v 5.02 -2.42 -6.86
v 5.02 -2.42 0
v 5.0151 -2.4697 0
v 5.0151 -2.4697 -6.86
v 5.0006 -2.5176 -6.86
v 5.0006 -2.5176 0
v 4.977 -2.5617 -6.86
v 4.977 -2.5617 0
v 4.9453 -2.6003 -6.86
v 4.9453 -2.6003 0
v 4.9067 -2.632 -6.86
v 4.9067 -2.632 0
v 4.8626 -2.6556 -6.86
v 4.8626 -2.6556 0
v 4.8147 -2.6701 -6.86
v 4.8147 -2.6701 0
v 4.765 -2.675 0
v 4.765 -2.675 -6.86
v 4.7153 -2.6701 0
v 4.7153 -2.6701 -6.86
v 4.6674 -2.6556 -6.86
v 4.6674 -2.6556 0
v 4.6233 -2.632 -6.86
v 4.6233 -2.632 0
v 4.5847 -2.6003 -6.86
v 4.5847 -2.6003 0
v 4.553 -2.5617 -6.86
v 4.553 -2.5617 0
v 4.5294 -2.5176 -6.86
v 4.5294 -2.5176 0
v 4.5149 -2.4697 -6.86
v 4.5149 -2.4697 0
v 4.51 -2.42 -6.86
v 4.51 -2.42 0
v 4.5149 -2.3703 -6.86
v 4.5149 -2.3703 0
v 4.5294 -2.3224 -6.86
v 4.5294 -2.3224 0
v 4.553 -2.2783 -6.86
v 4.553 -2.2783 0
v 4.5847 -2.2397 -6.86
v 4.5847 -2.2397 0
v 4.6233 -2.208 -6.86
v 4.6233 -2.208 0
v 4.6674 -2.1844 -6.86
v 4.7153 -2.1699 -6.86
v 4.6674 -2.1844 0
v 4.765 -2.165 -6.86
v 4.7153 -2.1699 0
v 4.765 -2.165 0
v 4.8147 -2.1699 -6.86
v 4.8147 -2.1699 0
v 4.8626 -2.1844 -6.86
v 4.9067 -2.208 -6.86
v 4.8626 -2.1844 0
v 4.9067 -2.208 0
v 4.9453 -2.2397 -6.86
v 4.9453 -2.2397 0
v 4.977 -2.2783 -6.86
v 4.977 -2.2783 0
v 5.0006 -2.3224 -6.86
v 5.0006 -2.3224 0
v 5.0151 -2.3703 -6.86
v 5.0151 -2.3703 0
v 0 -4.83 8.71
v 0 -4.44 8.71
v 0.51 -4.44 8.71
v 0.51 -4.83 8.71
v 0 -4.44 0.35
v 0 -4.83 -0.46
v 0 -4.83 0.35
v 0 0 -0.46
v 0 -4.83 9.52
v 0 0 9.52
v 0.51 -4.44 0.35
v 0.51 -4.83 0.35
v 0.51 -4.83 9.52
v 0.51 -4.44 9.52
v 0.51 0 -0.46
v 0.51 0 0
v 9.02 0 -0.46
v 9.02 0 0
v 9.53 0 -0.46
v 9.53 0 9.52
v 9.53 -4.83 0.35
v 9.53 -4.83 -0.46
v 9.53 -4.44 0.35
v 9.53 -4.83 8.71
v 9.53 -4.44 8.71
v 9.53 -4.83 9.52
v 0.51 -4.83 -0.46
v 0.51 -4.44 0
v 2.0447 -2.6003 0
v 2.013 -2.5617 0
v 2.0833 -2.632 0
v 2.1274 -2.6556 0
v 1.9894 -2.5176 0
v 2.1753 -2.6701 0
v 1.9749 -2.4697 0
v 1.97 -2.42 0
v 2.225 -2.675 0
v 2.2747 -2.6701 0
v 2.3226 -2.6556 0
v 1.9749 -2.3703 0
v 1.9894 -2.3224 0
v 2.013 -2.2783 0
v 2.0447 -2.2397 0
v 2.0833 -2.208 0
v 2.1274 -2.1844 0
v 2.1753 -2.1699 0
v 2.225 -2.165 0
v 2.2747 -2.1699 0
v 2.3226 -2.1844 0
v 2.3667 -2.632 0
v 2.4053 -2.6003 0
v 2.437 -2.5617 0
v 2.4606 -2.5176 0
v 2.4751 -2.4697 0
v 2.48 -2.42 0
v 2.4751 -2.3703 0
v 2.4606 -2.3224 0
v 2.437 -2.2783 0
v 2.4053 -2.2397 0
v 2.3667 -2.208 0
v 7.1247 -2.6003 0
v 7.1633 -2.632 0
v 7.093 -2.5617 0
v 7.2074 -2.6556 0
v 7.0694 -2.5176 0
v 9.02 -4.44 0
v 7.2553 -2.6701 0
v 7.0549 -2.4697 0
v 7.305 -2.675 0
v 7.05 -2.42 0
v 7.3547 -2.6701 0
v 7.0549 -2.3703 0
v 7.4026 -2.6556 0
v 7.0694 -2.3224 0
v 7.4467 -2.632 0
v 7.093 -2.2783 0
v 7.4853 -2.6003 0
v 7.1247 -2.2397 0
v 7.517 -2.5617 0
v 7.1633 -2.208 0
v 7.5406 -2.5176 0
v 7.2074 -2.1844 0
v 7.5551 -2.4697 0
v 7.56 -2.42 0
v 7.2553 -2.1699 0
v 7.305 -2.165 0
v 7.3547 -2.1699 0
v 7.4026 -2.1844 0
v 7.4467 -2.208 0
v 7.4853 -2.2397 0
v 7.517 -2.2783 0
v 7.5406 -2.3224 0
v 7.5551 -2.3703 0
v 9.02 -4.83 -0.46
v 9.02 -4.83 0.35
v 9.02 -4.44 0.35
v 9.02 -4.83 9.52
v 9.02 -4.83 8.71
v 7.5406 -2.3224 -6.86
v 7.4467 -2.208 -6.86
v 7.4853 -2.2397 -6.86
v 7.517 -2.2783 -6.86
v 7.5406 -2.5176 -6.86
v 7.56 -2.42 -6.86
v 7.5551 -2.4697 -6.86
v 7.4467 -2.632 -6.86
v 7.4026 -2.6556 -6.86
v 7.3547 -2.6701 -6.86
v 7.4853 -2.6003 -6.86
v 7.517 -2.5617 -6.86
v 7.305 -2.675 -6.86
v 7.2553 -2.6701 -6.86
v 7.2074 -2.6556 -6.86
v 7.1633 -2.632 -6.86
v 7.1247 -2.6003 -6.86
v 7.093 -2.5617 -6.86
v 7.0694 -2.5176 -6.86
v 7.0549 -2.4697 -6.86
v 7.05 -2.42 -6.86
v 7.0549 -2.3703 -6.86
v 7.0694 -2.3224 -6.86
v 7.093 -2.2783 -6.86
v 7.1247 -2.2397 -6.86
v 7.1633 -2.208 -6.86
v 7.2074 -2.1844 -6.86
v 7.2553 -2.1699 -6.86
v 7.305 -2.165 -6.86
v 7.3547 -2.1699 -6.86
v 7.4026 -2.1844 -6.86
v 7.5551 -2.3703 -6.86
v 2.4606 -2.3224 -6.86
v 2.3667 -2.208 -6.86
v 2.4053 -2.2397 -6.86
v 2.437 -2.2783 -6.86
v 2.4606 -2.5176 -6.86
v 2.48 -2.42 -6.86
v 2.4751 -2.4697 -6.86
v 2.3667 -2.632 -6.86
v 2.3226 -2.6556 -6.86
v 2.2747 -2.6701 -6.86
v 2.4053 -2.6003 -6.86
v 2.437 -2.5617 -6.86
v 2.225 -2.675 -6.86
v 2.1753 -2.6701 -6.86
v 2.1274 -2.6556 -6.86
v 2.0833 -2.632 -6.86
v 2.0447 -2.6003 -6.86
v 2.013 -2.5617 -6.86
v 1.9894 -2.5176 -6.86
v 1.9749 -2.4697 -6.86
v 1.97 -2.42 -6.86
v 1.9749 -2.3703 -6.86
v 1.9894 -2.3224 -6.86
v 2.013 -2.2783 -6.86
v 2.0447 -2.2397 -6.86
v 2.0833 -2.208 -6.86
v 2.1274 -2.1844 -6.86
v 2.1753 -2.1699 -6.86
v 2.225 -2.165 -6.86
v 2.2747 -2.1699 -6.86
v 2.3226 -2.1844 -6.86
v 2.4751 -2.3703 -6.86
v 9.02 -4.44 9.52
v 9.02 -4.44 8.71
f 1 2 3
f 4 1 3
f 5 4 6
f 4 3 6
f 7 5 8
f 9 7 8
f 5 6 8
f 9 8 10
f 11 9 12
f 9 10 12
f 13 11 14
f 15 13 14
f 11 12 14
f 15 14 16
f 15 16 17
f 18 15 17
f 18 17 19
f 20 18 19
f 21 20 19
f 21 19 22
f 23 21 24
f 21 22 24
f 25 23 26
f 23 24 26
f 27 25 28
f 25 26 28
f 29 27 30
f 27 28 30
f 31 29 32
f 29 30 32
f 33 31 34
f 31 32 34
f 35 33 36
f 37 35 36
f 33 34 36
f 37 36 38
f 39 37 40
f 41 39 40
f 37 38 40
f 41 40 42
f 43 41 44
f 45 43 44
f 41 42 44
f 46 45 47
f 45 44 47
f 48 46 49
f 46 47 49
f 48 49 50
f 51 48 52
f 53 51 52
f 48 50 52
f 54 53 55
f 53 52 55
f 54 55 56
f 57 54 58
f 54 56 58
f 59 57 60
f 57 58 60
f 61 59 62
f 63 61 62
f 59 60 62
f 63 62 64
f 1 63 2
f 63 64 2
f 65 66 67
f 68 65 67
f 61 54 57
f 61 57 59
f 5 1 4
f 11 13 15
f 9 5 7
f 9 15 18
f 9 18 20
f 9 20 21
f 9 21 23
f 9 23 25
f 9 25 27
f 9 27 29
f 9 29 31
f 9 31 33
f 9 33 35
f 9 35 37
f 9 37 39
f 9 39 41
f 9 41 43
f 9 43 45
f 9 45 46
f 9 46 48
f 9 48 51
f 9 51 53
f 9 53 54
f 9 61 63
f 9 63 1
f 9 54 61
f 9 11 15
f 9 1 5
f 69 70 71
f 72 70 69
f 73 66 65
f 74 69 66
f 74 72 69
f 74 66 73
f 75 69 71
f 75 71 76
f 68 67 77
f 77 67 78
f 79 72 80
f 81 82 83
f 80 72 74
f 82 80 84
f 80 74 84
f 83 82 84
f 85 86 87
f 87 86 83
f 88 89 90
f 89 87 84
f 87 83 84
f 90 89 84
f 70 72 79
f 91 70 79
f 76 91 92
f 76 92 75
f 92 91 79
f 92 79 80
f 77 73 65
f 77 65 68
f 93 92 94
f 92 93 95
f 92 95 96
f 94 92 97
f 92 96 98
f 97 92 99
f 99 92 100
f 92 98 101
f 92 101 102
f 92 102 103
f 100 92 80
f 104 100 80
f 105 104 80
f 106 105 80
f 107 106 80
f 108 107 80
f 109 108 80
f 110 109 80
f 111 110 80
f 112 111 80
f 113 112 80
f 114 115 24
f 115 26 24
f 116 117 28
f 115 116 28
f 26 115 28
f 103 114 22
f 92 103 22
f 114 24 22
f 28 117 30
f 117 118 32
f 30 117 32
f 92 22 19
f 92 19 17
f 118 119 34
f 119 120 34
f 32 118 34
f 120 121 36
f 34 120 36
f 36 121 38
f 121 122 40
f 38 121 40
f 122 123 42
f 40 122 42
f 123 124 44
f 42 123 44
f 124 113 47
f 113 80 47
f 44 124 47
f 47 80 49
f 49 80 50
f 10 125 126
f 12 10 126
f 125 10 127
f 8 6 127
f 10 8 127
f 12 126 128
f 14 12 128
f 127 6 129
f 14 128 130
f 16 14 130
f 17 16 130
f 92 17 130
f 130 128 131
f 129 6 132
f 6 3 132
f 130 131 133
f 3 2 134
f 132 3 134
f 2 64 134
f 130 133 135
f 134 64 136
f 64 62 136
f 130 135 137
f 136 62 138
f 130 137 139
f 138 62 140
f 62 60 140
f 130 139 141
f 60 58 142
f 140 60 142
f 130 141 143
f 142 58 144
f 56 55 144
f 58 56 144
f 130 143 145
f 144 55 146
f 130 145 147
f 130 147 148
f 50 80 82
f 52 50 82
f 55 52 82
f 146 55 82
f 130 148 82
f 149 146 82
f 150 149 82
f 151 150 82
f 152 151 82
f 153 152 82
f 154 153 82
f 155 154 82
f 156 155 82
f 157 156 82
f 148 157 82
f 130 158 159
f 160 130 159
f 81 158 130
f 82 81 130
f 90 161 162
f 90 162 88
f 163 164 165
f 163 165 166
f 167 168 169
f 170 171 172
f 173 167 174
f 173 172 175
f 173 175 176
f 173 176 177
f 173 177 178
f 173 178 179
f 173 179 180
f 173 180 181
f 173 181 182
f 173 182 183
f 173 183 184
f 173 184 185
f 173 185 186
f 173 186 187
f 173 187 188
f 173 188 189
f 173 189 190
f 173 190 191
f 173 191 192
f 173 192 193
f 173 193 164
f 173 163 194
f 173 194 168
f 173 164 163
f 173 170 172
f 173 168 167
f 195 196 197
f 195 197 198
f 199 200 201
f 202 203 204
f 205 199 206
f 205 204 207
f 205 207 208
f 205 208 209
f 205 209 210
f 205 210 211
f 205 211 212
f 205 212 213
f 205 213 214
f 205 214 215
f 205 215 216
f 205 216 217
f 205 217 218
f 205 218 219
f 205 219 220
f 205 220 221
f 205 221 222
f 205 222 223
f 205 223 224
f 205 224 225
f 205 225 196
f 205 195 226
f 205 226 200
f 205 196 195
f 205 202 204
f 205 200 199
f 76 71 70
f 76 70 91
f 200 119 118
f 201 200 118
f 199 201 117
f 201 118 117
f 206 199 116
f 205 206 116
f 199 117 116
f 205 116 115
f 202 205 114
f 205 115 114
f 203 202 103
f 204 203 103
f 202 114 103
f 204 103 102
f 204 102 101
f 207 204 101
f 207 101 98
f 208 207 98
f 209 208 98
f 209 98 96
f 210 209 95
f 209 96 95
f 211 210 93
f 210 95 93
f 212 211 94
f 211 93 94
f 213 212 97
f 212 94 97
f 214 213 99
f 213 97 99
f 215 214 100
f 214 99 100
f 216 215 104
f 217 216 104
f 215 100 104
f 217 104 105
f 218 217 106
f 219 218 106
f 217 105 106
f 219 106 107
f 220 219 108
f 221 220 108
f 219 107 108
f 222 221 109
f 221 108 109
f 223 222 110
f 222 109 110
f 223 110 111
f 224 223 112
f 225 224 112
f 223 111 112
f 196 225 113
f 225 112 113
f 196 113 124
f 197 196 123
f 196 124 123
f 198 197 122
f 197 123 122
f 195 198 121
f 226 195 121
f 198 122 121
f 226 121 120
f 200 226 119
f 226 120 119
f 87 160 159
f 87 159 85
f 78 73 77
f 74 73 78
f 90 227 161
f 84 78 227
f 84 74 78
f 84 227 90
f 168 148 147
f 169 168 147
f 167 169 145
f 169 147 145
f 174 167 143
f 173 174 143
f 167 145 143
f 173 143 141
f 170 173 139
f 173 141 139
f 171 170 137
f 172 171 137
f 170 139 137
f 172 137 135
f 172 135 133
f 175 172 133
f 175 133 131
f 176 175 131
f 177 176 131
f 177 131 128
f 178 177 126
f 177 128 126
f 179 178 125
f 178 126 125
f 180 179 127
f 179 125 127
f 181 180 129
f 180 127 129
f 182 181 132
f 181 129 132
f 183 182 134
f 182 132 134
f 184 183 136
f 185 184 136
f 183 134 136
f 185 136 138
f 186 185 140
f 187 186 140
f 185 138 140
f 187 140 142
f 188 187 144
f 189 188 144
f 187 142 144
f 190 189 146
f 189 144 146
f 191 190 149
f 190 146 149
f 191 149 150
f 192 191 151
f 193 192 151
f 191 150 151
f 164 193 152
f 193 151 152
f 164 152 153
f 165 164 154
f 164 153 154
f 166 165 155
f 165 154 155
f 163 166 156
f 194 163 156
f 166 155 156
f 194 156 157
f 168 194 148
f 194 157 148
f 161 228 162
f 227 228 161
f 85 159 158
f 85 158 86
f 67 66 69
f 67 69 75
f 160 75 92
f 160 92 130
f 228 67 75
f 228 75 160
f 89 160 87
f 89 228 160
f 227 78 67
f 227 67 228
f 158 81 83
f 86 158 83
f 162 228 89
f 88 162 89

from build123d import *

# Parameters (mm, degrees)
SKETCH_W     = 9.53
SKETCH_H     = 9.52
PAD_DEPTH    = 4.44
SKETCH001_W  = 0.51
SKETCH001_H  = 0.81
PAD001_DEPTH = 4.83
SKETCH004_R  = 0.255
PAD003_DEPTH = 6.86


with BuildPart() as part:
    # Sketch → Pad (new body)
    with BuildSketch(Plane.XZ):
        with Locations((4.765, 4.76)):
            Rectangle(SKETCH_W, SKETCH_H)
    extrude(amount=PAD_DEPTH)

    # Sketch001 → Pad001 (join)
    with BuildSketch(Plane.XZ):
        with Locations((0.255, 9.115)):
            Rectangle(SKETCH001_W, SKETCH001_H)
        with Locations((9.275, 9.115)):
            Rectangle(SKETCH001_W, SKETCH001_H)
        with Locations((9.275, -0.055)):
            Rectangle(SKETCH001_W, SKETCH001_H)
        with Locations((0.255, -0.055)):
            Rectangle(SKETCH001_W, SKETCH001_H)
    extrude(amount=PAD001_DEPTH)

    # Sketch004 (on Face19 of Pad001) → Pad003 (join)
    with BuildSketch(Plane(origin=(0, 0, 0), x_dir=(1, 0, 0), z_dir=(0, 0, -1))):
        with Locations((2.225, 2.42)):
            Circle(SKETCH004_R)
        with Locations((4.765, 2.42)):
            Circle(SKETCH004_R)
        with Locations((7.305, 2.42)):
            Circle(SKETCH004_R)
    extrude(amount=PAD003_DEPTH)


solid = part.part
